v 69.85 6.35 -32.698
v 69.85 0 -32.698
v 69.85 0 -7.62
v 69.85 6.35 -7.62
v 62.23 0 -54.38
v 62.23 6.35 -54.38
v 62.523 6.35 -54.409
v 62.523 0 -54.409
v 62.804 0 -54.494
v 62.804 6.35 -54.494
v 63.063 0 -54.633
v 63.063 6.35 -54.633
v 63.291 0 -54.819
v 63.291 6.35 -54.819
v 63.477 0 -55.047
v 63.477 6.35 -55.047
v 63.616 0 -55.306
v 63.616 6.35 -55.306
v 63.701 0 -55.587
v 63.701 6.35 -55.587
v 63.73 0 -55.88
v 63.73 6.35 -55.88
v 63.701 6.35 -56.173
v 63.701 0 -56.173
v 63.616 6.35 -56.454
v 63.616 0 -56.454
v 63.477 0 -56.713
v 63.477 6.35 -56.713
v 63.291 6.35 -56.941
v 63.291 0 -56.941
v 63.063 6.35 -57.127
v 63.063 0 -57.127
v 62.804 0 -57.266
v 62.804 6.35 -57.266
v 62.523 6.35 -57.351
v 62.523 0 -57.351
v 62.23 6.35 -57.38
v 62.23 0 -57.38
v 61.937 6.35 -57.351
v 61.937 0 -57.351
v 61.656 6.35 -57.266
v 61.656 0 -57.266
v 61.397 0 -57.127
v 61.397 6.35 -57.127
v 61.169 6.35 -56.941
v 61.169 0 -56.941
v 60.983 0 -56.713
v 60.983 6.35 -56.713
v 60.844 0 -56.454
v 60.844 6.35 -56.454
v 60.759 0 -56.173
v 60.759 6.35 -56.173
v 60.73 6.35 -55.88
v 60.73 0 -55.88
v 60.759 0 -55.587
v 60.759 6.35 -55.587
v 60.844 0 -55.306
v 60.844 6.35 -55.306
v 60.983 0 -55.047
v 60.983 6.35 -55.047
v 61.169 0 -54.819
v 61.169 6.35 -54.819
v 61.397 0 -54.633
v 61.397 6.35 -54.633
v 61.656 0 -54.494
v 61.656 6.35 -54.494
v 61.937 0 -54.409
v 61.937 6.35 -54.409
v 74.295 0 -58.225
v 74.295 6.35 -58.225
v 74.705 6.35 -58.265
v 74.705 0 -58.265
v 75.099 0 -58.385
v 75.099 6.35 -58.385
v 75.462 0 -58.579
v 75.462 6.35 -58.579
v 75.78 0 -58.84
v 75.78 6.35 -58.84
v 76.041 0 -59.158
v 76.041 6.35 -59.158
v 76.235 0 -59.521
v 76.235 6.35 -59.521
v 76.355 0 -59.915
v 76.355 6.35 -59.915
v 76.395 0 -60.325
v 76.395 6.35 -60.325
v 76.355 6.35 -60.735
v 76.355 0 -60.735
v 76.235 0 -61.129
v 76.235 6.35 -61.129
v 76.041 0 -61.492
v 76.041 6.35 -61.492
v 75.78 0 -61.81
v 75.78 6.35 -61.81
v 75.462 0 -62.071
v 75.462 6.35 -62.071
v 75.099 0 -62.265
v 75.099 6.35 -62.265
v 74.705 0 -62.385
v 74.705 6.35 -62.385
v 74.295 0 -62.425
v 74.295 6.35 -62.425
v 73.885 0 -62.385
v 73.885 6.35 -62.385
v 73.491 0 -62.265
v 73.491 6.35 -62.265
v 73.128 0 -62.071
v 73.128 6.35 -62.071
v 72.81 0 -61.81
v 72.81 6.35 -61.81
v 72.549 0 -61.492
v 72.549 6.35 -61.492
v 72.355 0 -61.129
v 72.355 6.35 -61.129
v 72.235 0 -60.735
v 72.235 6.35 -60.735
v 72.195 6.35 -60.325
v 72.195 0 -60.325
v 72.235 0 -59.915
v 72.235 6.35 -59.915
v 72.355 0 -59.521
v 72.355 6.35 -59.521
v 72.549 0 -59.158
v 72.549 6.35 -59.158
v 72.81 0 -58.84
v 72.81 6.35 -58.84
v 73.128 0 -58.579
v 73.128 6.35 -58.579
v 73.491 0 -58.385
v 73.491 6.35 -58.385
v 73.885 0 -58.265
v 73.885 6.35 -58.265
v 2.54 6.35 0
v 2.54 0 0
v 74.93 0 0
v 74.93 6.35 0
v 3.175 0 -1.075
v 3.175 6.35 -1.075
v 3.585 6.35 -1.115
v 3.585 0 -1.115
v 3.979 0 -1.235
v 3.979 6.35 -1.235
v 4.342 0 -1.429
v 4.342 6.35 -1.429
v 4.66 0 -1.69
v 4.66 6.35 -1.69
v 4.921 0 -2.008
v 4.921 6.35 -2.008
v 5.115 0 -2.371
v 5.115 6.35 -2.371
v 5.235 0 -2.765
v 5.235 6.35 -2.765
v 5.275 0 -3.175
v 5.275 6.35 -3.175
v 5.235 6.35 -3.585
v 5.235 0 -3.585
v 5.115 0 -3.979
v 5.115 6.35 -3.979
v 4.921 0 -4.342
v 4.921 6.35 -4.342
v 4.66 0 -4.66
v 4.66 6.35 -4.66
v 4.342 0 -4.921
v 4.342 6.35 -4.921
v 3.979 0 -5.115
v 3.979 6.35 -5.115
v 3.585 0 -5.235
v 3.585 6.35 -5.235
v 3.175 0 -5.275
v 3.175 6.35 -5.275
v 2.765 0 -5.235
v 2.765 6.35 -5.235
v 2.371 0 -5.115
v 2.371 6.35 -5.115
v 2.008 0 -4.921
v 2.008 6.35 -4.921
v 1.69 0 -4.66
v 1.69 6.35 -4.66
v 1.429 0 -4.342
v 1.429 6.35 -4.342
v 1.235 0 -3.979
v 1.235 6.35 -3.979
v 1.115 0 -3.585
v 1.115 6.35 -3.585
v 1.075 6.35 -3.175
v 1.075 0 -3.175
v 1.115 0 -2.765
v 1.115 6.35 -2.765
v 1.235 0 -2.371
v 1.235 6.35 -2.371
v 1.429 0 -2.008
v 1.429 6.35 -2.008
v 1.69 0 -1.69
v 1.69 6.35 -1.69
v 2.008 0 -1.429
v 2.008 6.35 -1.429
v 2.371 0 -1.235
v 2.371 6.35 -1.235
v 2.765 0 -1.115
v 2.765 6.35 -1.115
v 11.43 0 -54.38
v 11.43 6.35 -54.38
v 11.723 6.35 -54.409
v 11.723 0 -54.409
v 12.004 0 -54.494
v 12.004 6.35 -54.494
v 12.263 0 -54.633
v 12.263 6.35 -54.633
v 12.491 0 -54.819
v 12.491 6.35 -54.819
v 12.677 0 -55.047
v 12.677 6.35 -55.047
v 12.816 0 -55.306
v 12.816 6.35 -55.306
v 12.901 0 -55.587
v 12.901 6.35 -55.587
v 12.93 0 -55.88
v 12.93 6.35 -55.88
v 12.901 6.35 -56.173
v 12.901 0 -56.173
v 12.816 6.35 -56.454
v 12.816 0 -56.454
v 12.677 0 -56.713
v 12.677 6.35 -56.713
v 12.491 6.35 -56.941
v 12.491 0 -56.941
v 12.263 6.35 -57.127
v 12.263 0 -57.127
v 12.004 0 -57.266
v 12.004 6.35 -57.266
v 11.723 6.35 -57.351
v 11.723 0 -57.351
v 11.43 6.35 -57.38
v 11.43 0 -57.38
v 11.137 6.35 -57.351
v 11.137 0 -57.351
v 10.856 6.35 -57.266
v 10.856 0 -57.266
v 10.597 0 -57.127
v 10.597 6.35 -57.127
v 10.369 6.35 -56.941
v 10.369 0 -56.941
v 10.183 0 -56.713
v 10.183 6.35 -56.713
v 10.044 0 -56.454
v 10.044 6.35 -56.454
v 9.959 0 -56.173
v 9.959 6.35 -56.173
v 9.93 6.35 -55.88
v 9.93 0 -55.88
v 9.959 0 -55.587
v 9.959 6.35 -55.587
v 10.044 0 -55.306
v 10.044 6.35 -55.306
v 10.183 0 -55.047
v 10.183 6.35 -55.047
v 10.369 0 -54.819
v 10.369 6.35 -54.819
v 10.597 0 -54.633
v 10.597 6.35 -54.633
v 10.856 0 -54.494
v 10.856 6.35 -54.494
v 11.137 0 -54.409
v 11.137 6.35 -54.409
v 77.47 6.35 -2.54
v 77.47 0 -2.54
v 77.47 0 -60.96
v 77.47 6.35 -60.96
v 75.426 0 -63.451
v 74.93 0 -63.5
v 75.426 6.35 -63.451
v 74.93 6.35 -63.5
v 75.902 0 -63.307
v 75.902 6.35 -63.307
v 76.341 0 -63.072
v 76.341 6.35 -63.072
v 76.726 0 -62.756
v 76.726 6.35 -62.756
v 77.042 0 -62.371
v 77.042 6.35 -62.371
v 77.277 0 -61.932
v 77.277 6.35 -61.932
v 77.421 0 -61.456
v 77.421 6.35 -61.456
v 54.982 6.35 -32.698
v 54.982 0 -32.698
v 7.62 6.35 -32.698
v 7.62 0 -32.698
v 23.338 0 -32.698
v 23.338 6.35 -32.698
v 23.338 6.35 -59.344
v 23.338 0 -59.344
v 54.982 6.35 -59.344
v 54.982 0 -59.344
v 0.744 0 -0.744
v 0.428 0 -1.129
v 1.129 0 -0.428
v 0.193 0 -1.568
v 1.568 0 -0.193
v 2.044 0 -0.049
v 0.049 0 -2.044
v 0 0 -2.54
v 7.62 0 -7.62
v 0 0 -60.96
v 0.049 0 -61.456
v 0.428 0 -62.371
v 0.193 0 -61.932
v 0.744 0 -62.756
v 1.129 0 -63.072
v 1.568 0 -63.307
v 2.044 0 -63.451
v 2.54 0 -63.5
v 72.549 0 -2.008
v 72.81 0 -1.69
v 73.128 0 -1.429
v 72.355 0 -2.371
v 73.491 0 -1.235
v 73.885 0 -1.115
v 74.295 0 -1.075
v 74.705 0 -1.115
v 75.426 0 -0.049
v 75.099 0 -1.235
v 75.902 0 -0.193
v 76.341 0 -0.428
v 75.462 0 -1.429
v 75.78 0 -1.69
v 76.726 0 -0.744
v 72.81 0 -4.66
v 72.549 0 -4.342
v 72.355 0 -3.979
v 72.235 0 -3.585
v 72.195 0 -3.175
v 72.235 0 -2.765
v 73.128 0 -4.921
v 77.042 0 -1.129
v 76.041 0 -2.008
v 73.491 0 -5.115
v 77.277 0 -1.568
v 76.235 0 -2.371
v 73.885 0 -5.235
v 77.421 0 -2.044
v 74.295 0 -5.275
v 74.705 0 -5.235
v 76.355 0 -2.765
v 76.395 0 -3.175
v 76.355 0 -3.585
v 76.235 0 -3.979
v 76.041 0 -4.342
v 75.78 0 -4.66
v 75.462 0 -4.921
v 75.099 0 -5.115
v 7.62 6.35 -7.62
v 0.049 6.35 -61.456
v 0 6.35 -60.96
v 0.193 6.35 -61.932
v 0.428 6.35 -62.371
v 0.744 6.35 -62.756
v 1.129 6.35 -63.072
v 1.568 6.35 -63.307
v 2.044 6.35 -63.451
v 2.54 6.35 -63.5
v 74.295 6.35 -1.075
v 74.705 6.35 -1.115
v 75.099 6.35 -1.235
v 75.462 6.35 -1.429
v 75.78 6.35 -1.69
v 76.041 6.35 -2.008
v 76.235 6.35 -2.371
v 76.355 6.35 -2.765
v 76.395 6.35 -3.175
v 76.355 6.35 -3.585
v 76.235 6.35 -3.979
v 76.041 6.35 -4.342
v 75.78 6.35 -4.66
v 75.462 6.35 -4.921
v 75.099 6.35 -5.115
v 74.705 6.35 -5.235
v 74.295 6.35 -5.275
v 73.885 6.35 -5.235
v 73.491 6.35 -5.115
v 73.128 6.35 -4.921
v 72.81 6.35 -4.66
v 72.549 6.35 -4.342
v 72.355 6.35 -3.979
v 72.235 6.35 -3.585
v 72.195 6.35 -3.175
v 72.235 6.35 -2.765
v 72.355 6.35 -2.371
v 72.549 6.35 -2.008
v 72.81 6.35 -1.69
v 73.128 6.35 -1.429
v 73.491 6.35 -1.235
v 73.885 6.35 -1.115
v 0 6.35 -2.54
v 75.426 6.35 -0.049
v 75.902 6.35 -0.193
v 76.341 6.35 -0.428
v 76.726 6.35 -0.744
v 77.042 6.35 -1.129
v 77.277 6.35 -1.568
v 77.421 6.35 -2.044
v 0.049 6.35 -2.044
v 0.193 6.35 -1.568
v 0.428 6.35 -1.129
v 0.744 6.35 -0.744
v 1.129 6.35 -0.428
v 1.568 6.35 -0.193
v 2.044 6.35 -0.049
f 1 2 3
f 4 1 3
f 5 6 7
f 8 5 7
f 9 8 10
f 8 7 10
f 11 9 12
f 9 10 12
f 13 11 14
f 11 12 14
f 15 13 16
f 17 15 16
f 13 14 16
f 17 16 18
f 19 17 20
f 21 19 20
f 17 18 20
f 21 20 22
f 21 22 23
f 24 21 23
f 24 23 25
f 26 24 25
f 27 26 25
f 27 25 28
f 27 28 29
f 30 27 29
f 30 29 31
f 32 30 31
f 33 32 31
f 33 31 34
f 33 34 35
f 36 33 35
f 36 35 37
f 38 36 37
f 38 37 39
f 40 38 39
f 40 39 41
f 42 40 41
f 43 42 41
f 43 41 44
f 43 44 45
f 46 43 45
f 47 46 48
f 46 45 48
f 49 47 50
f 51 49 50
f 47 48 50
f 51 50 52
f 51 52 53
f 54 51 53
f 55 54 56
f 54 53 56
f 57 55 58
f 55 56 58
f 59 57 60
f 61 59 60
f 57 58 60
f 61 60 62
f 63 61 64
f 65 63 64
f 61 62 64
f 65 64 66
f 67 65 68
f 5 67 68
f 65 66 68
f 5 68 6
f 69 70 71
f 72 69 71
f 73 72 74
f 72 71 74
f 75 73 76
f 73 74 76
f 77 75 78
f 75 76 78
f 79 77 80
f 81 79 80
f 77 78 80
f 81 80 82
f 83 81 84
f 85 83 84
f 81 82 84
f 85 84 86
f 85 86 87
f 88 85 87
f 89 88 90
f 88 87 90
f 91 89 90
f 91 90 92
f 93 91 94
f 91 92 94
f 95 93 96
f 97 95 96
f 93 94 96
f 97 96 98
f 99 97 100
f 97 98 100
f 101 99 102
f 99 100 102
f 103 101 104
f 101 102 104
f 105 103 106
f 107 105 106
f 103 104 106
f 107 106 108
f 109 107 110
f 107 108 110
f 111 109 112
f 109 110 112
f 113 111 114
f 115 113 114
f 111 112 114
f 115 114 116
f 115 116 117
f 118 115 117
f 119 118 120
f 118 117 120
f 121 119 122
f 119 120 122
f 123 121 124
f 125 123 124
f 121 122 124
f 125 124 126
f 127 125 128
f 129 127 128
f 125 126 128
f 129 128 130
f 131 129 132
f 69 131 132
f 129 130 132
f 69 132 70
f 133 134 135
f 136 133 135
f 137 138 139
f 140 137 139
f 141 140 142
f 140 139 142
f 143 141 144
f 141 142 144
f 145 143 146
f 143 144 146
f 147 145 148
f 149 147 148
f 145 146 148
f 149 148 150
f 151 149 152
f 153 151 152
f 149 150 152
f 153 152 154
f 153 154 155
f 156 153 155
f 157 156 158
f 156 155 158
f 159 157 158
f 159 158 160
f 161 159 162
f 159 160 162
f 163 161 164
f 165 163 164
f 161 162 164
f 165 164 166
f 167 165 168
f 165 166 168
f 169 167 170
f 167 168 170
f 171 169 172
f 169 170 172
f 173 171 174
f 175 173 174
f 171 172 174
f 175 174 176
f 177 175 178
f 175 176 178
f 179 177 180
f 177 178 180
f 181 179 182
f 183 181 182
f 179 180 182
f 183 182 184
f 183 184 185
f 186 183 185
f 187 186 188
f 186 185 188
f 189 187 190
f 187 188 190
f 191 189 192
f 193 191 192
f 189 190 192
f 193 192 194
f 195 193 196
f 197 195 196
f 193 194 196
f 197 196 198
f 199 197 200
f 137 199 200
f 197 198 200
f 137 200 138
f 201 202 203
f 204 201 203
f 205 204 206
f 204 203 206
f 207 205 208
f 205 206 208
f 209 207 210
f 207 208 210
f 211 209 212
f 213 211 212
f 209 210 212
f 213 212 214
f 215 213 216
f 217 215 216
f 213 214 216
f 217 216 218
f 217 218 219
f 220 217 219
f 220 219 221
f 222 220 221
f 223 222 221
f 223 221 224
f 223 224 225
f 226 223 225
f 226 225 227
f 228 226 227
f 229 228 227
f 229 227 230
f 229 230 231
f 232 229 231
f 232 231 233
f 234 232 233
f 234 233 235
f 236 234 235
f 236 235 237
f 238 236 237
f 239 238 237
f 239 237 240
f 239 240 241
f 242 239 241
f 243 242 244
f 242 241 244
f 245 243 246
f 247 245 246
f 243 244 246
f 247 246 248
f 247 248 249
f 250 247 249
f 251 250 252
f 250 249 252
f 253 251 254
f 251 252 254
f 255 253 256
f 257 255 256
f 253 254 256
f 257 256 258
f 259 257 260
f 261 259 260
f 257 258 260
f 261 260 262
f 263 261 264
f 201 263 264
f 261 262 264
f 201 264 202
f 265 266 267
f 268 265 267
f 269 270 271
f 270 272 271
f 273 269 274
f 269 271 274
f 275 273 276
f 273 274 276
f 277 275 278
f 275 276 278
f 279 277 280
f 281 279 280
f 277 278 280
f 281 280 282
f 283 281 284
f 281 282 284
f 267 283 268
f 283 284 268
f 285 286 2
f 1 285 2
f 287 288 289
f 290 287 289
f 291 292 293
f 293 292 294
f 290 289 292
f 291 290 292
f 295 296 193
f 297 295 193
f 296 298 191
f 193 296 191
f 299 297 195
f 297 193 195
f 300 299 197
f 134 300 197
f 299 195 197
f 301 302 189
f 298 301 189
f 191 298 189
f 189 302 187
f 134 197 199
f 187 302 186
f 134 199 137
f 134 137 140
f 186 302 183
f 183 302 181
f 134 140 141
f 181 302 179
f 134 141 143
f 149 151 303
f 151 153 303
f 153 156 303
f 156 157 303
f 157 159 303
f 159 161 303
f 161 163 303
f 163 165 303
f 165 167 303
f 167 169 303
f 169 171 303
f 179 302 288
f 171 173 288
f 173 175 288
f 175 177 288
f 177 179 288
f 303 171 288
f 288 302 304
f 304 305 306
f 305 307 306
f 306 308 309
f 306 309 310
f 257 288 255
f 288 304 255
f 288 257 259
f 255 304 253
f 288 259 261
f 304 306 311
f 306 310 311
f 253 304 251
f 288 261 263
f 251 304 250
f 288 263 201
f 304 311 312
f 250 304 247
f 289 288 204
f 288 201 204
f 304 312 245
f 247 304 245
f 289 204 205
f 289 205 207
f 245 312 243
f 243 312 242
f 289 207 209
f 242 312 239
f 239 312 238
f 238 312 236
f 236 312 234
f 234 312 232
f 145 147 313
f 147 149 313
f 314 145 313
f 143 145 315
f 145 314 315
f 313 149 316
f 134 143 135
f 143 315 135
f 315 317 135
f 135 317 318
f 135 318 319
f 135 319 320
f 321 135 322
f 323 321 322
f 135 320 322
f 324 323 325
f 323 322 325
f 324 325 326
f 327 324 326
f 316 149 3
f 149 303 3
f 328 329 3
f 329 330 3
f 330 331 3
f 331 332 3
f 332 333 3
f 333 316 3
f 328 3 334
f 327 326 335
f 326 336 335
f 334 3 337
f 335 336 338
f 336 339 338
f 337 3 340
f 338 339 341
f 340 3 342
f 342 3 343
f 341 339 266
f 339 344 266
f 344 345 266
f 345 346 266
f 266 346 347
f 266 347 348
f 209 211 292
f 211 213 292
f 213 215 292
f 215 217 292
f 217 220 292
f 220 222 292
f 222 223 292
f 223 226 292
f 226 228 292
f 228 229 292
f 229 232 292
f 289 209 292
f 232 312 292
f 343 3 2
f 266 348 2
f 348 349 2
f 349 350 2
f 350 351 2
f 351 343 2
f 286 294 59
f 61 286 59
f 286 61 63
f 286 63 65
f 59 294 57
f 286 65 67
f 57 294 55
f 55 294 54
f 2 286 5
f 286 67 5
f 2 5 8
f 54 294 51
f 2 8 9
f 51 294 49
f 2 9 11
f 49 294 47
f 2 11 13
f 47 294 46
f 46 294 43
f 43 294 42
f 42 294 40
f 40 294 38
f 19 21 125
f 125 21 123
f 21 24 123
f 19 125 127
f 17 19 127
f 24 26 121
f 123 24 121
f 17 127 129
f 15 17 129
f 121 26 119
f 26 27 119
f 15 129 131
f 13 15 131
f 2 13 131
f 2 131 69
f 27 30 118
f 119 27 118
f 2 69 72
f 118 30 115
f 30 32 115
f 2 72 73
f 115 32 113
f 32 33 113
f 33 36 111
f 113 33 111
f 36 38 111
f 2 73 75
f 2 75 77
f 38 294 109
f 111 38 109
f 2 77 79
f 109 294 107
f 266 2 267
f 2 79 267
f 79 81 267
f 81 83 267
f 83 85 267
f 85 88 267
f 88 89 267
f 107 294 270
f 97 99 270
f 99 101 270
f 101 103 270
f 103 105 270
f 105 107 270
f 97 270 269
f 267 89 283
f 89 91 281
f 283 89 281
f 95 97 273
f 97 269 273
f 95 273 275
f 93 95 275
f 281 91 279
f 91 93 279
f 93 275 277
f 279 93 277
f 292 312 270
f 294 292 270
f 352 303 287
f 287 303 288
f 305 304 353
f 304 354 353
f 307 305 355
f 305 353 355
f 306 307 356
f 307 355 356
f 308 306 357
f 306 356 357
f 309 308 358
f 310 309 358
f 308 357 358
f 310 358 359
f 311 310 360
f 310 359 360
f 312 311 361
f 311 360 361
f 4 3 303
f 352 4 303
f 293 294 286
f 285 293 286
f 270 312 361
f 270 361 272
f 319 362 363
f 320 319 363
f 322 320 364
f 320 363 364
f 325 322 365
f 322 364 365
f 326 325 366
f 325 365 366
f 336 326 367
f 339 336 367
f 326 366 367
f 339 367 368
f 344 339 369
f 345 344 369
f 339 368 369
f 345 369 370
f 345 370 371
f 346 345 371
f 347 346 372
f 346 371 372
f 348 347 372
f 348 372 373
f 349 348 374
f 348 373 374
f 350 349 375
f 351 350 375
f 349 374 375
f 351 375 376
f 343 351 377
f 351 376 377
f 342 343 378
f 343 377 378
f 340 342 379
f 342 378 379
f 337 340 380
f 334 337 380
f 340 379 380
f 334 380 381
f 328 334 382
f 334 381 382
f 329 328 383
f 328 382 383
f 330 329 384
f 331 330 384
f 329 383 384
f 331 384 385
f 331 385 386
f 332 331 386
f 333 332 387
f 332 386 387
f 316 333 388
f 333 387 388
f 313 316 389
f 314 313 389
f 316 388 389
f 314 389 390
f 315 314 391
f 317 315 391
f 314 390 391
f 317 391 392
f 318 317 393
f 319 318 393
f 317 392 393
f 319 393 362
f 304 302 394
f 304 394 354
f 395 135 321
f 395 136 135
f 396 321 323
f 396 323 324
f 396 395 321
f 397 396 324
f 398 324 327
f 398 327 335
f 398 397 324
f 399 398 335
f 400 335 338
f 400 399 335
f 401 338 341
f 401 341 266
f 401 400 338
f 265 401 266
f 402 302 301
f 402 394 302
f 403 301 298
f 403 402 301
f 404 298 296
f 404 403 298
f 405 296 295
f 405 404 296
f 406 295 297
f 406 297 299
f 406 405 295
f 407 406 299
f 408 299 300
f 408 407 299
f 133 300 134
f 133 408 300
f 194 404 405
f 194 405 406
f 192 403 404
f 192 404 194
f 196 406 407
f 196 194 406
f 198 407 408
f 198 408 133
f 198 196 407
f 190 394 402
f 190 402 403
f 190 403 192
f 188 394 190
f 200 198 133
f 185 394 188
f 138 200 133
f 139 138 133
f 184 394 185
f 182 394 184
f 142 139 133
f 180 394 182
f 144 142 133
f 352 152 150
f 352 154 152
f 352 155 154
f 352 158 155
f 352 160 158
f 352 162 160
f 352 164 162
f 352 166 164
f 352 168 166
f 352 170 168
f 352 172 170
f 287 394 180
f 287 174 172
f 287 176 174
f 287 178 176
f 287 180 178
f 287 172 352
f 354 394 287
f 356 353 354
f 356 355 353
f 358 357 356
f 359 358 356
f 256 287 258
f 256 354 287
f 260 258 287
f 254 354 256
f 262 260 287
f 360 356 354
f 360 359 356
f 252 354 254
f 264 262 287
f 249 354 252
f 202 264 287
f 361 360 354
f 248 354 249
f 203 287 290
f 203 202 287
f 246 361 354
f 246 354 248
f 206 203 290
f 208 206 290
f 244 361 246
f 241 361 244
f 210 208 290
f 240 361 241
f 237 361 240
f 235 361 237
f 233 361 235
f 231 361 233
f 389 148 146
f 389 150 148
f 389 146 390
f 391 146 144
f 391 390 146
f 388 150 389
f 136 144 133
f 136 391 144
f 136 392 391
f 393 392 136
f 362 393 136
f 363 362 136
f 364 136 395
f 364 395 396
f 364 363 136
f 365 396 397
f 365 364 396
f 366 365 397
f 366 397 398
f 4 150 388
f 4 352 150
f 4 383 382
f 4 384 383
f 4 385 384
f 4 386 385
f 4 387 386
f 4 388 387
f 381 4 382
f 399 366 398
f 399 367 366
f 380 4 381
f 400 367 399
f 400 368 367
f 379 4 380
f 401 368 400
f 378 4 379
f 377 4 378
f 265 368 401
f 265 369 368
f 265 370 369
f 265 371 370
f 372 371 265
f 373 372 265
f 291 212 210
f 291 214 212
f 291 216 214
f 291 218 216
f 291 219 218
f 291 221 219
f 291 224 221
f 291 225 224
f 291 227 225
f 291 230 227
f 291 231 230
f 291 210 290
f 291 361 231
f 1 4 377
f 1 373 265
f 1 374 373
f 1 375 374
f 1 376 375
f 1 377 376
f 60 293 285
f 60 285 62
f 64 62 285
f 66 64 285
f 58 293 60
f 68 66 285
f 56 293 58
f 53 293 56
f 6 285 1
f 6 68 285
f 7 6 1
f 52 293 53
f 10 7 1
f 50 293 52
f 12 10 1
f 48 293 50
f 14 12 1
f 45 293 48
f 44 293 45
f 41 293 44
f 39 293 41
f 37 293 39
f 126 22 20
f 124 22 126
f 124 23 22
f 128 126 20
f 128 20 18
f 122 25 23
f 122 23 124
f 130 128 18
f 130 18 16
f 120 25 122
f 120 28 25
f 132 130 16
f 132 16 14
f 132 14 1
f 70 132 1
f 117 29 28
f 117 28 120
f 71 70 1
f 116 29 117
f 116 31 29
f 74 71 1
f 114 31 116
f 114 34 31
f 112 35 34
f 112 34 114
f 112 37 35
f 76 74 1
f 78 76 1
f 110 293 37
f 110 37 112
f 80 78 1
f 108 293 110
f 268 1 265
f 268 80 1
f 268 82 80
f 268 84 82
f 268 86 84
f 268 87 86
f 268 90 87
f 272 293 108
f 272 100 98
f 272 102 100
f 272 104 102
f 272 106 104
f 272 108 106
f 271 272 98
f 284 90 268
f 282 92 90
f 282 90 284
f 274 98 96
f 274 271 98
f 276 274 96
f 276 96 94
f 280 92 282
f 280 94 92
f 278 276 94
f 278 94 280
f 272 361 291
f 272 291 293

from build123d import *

# Parameters (mm, degrees)
SKETCH1_W           = 77.47
SKETCH1_H           = 63.5
BOSS_EXTRUDE1_DEPTH = 6.35
SKETCH2_R           = 2.1
CUT_EXTRUDE1_DEPTH  = 6.35
FILLET1_R           = 2.54
SKETCH3_R           = 1.5
CUT_EXTRUDE2_DEPTH  = 10.16


with BuildPart() as part:
    # Sketch1 → Boss-Extrude1 (new body)
    with BuildSketch(Plane(origin=(0, 0, 0), x_dir=(1, 0, 0), z_dir=(0, 1, 0))):
        with Locations((38.735, 31.75)):
            Rectangle(SKETCH1_W, SKETCH1_H)
        Polygon((23.33761346, 32.697540577), (23.33761346, 59.344124755), (54.982420655, 59.344124755), (54.982420655, 32.697540577), (69.85, 32.697540577), (69.85, 7.62), (7.62, 7.62), (7.62, 32.697540577), align=None, mode=Mode.SUBTRACT)
    extrude(amount=BOSS_EXTRUDE1_DEPTH)

    # Sketch2 → Cut-Extrude1 (cut)
    with BuildSketch(Plane(origin=(0, 6.35, 0), x_dir=(1, 0, 0), z_dir=(0, 1, 0))):
        with Locations(Location((3.175, 3.175, 0), (0, 0, 270))):
            Circle(SKETCH2_R)
        with Locations(Location((74.295, 3.175, 0), (0, 0, 270))):
            Circle(SKETCH2_R)
        with Locations(Location((74.295, 60.325, 0), (0, 0, 270))):
            Circle(SKETCH2_R)
    extrude(amount=-CUT_EXTRUDE1_DEPTH, mode=Mode.SUBTRACT)

    # Fillet1
    fillet1_edges = [part.edges().sort_by_distance(p)[0] for p in [
        (0, 3.175, 0),
        (0, 3.175, -63.5),
        (77.47, 3.175, -63.5),
        (77.47, 3.175, 0),
    ]]
    fillet(fillet1_edges, radius=FILLET1_R)

    # Sketch3 → Cut-Extrude2 (cut)
    with BuildSketch(Plane(origin=(0, 6.35, 0), x_dir=(1, 0, 0), z_dir=(0, 1, 0))):
        with Locations(Location((11.43, 55.88, 0), (0, 0, 270))):
            Circle(SKETCH3_R)
        with Locations(Location((62.23, 55.88, 0), (0, 0, 270))):
            Circle(SKETCH3_R)
    extrude(amount=-CUT_EXTRUDE2_DEPTH, mode=Mode.SUBTRACT)


solid = part.part
